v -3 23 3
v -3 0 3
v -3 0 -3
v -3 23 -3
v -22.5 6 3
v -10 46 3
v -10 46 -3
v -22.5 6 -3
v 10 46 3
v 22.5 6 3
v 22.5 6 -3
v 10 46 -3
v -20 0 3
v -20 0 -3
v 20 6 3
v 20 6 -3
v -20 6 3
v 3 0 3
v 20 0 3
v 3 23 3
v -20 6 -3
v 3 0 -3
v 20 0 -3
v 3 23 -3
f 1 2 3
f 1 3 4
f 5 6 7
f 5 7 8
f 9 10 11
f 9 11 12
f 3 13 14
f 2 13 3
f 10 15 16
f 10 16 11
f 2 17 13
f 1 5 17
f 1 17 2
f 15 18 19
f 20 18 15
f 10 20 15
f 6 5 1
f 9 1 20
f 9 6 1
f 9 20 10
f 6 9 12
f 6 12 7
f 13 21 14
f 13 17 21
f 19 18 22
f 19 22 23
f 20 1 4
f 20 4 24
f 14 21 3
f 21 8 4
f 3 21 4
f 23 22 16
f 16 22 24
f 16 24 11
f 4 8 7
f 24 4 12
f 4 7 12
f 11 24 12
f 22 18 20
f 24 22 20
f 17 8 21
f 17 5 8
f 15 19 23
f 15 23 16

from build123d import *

# Parameters (mm, degrees)
BOSS_EXTRUDE1_DEPTH = 3
SKETCH2_W           = 6
SKETCH2_H           = 23
CUT_EXTRUDE1_DEPTH  = 7


with BuildPart() as part:
    # Sketch1 → Boss-Extrude1 (new body, symmetric)
    with BuildSketch(Plane.XY):
        Polygon((-20, 0), (20, 0), (20, 6), (22.5, 6), (10, 46), (-10, 46), (-22.5, 6), (-20, 6), align=None)
    extrude(amount=BOSS_EXTRUDE1_DEPTH, both=True)

    # Sketch2 → Cut-Extrude1 (cut, through all)
    with BuildSketch(Plane.XY.offset(3)):
        with Locations((0, 11.5)):
            Rectangle(SKETCH2_W, SKETCH2_H)
    extrude(amount=-CUT_EXTRUDE1_DEPTH, mode=Mode.SUBTRACT)


solid = part.part
